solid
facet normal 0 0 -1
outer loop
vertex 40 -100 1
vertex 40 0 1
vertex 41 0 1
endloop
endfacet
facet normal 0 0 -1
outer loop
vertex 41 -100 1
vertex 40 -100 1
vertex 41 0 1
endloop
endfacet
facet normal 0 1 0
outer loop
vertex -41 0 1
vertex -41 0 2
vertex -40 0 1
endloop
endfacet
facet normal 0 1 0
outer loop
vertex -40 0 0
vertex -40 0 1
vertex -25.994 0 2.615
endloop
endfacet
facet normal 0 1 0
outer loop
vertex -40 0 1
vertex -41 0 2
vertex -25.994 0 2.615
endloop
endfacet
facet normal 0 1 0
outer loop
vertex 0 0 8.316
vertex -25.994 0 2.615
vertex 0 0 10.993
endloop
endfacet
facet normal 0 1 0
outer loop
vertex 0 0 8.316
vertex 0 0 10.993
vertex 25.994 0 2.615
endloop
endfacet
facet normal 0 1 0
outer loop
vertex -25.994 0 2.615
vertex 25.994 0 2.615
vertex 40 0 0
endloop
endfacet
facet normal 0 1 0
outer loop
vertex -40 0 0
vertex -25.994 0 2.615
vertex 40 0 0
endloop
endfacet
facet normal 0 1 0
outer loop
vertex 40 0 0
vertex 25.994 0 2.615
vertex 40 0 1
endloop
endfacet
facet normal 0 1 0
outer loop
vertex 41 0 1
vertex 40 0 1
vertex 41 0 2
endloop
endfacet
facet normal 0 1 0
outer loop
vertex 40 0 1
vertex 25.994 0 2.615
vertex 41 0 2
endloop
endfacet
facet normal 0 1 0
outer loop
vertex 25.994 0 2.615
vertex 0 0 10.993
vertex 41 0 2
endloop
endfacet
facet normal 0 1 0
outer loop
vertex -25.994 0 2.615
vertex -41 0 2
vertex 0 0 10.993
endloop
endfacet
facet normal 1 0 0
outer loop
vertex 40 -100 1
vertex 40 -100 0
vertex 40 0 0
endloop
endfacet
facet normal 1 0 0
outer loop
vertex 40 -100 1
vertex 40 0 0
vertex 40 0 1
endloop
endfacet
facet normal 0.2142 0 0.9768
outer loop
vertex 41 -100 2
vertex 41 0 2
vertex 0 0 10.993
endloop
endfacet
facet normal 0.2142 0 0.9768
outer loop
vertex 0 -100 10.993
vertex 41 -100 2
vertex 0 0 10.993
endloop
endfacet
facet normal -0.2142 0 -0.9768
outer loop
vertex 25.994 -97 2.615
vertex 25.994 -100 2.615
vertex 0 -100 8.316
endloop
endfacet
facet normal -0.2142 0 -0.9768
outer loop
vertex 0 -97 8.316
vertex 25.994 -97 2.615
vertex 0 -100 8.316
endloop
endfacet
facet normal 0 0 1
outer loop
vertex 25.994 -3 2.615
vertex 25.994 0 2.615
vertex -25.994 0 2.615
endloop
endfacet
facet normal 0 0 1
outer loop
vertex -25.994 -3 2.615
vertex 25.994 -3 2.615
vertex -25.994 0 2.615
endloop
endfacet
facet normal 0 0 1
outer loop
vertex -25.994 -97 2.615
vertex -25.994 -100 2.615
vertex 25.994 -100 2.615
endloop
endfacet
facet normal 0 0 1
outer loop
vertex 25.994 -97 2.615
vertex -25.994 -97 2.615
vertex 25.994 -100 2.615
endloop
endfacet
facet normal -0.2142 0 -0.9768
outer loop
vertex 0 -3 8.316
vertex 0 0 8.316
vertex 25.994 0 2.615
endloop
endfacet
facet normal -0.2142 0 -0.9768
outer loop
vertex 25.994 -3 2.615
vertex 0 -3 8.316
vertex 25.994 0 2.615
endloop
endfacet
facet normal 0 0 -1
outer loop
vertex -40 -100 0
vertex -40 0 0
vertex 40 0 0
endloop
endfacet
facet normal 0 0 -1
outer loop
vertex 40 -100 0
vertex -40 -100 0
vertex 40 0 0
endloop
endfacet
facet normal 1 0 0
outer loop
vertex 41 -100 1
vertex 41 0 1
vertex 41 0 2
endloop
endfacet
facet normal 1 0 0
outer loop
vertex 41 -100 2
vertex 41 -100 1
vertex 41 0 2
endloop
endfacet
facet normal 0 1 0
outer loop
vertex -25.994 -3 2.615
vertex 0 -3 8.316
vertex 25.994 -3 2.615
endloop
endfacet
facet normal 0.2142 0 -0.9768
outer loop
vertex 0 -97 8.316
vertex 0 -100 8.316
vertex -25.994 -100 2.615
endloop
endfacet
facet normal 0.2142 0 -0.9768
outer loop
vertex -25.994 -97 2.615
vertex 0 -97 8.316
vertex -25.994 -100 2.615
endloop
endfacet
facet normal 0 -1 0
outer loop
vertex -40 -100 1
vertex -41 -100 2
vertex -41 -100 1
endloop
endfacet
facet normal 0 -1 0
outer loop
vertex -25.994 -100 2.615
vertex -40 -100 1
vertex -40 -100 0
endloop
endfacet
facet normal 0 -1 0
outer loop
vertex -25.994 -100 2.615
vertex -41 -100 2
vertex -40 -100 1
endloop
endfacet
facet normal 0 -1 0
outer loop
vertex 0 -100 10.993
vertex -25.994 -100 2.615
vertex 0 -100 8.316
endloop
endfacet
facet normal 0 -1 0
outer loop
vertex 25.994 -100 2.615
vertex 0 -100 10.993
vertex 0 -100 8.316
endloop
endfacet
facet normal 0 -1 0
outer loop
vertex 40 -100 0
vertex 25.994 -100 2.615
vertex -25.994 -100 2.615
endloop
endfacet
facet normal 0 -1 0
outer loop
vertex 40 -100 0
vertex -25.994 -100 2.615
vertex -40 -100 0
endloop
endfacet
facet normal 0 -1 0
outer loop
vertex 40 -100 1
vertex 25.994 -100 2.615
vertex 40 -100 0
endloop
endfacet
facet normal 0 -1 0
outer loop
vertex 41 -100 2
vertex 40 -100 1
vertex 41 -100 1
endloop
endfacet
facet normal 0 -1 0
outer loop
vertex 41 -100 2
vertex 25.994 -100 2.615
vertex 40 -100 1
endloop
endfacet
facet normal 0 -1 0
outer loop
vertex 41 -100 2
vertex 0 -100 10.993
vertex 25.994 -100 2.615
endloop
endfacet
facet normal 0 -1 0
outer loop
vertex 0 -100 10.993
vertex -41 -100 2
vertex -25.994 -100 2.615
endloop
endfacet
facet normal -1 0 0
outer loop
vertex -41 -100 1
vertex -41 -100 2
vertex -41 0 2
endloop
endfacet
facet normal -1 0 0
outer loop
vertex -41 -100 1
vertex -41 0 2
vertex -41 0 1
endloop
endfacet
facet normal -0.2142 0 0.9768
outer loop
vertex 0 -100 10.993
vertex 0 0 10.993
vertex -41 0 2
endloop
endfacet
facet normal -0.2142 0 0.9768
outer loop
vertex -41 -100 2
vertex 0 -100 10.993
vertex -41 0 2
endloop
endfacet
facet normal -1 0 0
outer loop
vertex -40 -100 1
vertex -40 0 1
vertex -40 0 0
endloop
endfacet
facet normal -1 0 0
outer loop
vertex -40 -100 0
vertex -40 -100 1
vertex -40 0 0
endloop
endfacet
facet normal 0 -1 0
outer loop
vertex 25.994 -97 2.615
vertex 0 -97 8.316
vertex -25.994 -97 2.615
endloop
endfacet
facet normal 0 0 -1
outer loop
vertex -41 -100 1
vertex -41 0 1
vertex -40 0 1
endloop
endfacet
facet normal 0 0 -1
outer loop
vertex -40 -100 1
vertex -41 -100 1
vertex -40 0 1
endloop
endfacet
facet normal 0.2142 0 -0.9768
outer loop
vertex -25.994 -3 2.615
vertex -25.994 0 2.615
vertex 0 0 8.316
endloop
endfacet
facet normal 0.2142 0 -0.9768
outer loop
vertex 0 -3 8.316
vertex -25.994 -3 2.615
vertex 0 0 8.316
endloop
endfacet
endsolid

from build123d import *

# Parameters (mm, degrees)
F1_DEPTH = 100
F3_DEPTH = 3
F5_DEPTH = 3


with BuildPart() as f1:
    # F0 (on Front) → F1 (new body)
    with BuildSketch(Plane.XZ):
        Polygon((-40, 0), (0, 0), (40, 0), (40, 1), (41, 1), (41, 2), (0, 10.992676), (-41, 2), (-41, 1), (-40, 1), align=None)
    extrude(amount=F1_DEPTH)

    # F2 (on face) → F3 (cut)
    with BuildSketch(Plane(origin=(0, 0, 0), x_dir=(-1, 0, 0), z_dir=(0, 1, 0))):
        Polygon((0, 8.315965), (-25.994221, 2.61456), (0, 2.61456), align=None)
        Polygon((25.994221, 2.61456), (0, 8.315965), (0, 2.61456), align=None)
    extrude(amount=-F3_DEPTH, mode=Mode.SUBTRACT)

    # F4 (on face) → F5 (cut)
    with BuildSketch(Plane.XZ.offset(100)):
        Polygon((0, 2.61456), (25.994221, 2.61456), (0, 8.315965), (-25.994221, 2.61456), align=None)
    extrude(amount=-F5_DEPTH, mode=Mode.SUBTRACT)


solid = f1.part
